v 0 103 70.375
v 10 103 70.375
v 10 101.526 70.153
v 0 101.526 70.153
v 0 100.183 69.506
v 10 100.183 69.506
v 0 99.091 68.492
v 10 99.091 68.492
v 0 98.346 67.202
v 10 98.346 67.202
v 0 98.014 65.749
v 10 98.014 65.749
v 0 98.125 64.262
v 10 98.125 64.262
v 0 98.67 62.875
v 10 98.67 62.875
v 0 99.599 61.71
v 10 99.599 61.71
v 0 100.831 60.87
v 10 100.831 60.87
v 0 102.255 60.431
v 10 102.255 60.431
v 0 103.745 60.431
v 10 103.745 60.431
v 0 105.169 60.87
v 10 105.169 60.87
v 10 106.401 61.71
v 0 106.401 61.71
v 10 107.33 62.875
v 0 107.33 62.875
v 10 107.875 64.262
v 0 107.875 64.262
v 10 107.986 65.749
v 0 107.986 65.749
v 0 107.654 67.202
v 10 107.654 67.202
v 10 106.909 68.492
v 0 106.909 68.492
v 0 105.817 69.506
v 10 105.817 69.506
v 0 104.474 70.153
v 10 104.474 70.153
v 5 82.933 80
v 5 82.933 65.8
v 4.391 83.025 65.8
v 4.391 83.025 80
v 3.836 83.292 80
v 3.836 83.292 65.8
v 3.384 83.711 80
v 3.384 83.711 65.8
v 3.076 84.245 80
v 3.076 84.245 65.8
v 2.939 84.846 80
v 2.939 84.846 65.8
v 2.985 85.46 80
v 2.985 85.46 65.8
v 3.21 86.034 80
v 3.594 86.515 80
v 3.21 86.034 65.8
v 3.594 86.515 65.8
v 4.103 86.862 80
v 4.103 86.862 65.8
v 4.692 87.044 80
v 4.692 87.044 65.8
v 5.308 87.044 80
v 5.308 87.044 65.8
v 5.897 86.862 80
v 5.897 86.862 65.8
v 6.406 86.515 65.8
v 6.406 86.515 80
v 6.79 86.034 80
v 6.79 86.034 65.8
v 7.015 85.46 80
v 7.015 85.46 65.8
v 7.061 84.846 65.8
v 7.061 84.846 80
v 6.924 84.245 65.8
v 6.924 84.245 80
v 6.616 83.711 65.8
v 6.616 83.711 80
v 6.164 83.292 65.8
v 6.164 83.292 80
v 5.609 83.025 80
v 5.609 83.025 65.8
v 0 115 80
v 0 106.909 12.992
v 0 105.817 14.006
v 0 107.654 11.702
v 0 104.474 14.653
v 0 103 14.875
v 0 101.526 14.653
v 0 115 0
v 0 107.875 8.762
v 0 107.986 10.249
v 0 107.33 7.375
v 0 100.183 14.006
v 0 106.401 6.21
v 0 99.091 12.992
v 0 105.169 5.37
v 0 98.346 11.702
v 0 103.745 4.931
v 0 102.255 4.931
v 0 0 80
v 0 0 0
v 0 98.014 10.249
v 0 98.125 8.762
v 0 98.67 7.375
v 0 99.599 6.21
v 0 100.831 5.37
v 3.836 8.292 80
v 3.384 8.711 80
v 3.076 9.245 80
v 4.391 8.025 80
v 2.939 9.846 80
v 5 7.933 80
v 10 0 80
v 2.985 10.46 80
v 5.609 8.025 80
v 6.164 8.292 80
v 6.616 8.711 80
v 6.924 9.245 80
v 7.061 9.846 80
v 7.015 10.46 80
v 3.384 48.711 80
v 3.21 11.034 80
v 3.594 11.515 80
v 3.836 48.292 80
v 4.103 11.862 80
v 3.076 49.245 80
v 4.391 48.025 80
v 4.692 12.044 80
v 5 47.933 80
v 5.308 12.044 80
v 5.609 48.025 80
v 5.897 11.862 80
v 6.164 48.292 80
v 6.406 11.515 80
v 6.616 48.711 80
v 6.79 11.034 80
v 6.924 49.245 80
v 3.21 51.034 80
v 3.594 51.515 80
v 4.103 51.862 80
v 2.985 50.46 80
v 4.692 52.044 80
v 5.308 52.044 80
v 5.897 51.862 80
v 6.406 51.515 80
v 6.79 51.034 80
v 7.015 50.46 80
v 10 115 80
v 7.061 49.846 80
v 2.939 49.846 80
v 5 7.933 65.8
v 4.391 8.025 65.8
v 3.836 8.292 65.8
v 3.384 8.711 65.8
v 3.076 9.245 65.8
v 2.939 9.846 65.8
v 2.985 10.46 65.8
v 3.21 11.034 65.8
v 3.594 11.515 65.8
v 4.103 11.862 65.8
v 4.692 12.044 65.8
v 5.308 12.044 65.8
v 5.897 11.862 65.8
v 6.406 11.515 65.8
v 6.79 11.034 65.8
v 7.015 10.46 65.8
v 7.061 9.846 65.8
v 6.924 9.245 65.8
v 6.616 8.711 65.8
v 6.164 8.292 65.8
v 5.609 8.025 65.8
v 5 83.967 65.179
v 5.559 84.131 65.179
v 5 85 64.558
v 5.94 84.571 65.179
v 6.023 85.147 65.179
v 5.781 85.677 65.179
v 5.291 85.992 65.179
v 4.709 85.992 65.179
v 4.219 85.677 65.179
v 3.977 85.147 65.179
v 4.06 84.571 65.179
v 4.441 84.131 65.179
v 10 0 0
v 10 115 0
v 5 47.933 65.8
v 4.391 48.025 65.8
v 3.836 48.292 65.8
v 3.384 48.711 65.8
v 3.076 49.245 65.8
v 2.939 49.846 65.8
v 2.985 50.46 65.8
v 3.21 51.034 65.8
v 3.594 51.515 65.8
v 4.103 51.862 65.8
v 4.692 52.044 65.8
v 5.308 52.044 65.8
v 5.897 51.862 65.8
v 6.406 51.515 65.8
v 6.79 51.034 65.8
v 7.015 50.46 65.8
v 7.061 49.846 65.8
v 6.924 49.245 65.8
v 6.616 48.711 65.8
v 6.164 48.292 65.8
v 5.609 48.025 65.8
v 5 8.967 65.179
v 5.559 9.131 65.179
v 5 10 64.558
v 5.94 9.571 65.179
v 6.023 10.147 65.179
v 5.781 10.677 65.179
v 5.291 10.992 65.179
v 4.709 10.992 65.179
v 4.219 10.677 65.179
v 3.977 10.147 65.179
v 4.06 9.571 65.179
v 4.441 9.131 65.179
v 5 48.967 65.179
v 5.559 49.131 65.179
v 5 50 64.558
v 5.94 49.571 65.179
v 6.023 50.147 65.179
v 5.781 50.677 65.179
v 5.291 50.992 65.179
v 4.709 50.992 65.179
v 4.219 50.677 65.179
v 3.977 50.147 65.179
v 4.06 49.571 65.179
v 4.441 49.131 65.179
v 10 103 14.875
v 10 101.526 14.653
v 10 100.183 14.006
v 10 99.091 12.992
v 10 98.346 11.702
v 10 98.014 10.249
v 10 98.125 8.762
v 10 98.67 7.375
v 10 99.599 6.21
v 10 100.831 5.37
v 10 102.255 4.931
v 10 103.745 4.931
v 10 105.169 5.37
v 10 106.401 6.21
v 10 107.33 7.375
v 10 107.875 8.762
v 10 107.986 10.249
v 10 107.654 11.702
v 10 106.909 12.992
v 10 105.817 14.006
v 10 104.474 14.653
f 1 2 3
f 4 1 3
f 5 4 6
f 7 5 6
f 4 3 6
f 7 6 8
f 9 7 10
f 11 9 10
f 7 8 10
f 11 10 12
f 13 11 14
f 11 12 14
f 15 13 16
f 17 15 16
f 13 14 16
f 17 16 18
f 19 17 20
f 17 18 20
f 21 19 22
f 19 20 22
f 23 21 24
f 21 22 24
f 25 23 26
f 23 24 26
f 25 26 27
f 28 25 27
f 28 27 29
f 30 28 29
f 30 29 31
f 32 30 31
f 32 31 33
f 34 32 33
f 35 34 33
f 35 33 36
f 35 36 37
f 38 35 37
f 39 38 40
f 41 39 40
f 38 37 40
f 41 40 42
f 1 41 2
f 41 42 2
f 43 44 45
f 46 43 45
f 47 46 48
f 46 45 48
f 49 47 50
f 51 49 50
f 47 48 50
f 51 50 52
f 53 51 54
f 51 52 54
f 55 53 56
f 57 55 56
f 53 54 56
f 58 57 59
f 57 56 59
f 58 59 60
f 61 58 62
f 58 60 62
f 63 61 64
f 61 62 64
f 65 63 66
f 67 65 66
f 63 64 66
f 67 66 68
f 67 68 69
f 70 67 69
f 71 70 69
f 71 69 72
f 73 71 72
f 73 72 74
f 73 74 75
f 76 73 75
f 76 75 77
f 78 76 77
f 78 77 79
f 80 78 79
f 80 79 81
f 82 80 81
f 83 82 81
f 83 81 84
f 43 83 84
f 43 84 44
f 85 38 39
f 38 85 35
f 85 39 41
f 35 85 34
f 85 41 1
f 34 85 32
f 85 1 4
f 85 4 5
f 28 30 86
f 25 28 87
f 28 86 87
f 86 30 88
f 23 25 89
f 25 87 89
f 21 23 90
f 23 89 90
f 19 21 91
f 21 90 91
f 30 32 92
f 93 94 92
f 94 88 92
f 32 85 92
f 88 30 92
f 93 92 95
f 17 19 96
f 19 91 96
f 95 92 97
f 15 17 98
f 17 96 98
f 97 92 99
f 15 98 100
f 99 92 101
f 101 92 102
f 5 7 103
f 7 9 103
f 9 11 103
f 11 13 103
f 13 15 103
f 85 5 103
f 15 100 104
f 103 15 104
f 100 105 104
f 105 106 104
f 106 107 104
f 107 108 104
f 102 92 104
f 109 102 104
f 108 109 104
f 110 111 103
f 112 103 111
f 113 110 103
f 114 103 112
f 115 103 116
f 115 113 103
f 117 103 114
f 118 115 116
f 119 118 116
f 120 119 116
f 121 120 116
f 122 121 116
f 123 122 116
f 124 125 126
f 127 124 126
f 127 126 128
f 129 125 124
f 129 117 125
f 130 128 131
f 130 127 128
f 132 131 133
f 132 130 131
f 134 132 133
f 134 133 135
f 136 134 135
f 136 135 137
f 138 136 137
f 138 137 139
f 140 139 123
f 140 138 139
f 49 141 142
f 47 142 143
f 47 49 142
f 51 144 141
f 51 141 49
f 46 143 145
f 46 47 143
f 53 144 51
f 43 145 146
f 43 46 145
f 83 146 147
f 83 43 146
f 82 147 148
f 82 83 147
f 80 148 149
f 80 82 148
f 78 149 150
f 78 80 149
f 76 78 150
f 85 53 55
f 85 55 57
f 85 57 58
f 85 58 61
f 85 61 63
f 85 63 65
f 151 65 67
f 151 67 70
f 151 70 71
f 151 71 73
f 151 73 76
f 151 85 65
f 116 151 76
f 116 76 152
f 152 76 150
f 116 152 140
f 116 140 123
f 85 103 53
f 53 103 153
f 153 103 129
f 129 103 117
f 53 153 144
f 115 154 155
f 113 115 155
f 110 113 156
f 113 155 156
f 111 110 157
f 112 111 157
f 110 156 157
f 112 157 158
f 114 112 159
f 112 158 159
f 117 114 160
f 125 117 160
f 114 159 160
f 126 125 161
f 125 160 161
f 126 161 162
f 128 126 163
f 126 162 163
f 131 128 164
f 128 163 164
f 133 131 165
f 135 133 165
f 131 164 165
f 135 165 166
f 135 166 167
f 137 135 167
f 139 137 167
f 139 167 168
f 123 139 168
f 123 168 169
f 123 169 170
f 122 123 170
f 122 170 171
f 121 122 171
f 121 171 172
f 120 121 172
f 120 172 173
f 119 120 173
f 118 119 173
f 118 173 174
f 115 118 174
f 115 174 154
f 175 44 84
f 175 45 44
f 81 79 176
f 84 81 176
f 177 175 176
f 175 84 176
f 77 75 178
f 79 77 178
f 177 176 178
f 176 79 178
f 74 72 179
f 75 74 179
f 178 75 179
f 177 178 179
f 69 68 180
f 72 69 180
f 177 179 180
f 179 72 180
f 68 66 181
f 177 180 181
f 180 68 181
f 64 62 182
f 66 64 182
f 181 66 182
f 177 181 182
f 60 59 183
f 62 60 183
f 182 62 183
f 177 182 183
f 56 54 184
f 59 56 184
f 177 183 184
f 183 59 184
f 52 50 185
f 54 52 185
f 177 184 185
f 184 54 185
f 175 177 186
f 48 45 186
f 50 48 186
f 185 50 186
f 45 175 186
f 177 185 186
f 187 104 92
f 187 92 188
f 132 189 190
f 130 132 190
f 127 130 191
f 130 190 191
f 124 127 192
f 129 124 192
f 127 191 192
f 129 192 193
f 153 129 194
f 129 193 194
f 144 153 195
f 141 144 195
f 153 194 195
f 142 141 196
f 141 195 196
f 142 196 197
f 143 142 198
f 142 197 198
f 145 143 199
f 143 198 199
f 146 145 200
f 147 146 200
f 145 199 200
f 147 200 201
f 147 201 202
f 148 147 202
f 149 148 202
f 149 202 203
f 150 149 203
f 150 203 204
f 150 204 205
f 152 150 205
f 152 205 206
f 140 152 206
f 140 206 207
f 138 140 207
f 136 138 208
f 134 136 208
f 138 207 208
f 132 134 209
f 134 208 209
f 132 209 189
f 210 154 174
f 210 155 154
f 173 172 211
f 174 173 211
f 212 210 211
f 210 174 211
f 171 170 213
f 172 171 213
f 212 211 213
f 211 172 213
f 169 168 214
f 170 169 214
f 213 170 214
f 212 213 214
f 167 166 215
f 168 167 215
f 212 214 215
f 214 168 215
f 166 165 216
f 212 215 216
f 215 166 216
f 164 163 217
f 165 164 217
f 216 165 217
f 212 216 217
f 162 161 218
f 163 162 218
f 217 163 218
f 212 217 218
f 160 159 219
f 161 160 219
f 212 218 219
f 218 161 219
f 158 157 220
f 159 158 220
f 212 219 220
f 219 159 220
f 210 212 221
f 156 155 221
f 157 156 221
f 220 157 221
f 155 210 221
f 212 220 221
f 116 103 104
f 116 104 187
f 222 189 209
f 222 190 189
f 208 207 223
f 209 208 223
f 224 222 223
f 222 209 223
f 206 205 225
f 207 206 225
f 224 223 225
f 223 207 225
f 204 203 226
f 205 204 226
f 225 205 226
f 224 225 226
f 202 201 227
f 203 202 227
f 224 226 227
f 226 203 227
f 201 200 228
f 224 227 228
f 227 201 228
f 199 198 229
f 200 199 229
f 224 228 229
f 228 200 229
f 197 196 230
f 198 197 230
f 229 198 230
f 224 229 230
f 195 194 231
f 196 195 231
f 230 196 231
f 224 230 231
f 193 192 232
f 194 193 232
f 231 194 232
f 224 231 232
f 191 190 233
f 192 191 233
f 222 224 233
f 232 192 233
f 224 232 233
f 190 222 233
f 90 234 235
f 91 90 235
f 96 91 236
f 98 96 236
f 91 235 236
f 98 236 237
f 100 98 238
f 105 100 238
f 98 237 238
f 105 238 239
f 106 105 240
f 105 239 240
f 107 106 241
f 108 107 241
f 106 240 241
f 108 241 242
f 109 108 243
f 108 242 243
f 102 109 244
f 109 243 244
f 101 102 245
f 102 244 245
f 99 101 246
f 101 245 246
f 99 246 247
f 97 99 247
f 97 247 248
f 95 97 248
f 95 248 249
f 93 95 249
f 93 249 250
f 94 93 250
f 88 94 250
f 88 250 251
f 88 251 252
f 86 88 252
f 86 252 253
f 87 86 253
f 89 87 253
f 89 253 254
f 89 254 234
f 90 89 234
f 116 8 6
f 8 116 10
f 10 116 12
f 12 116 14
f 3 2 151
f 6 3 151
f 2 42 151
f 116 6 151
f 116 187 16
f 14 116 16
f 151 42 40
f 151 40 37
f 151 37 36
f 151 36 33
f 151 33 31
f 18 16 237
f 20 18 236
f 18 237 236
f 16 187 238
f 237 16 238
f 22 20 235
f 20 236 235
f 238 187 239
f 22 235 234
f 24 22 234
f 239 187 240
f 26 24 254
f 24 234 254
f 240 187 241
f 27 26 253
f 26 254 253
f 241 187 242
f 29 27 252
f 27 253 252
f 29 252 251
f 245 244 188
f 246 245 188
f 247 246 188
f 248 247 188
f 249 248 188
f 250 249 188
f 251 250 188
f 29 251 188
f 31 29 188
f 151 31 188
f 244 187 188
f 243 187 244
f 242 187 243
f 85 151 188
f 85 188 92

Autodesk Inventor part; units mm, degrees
ref_plane "YZ Plane" through (0, 0, 0) normal (1, 0, 0) x (0, 1, 0)
ref_plane "XZ Plane" through (0, 0, 0) normal (0, 1, 0) x (-1, 0, 0)
ref_plane "XY Plane" through (0, 0, 0) normal (0, 0, 1) x (1, 0, 0)
sketch "Skizze1" plane through (0, 0, 0) normal (0, 0, 1) x (1, 0, 0)
  line L0 (0, 0) -> (10, 0)
  line L1 (10, 0) -> (10, 115)
  line L2 (10, 115) -> (0, 115)
  line L3 (0, 115) -> (0, 0)
  dimension "d0" = 10
  dimension "d1" = 115
extrude "Extrusion1" add sketch "Skizze1" along normal blind 80
sketch "Skizze2" plane through (0, 0, 0) normal (-1, 0, 0) x (0, 0, 1)
  line L0 (0, 0) -> (0, 115) projected
  line L1 (0, 115) -> (0, 103)
  line L2 (0, 103) -> (9.875, 103)
  line L3 (9.875, 103) -> (65.375, 103)
  dimension "d4" = 12
  dimension "d5" = 9.875
  dimension "d6" = 55.5
hole "Bohrung1" at (0, 103, 9.875) at (0, 103, 65.375) direction (1, 0, 0) diameter 10 end through all
sketch "Skizze3" plane through (0, 0, 80) normal (0, 0, 1) x (1, 0, 0)
  line L0 (10, 115) -> (0, 115) projected
  line L1 (5, 115) -> (5, 85)
  line L2 (5, 85) -> (5, 50)
  line L3 (5, 50) -> (5, 10)
  point P0 (0, 0)
  dimension "d14" = 30
  dimension "d15" = 35
  dimension "d16" = 40
hole "Bohrung2" at (5, 85, 80) at (5, 10, 80) at (5, 50, 80) direction (0, 0, -1) diameter 4.134 depth 14.2 tip angle 118 thread size "M5x0.8" class "6H" standard "ISO Metric profile"
properties part number "Motorhalterung_Grundplatte" material "Aluminium 6061"
